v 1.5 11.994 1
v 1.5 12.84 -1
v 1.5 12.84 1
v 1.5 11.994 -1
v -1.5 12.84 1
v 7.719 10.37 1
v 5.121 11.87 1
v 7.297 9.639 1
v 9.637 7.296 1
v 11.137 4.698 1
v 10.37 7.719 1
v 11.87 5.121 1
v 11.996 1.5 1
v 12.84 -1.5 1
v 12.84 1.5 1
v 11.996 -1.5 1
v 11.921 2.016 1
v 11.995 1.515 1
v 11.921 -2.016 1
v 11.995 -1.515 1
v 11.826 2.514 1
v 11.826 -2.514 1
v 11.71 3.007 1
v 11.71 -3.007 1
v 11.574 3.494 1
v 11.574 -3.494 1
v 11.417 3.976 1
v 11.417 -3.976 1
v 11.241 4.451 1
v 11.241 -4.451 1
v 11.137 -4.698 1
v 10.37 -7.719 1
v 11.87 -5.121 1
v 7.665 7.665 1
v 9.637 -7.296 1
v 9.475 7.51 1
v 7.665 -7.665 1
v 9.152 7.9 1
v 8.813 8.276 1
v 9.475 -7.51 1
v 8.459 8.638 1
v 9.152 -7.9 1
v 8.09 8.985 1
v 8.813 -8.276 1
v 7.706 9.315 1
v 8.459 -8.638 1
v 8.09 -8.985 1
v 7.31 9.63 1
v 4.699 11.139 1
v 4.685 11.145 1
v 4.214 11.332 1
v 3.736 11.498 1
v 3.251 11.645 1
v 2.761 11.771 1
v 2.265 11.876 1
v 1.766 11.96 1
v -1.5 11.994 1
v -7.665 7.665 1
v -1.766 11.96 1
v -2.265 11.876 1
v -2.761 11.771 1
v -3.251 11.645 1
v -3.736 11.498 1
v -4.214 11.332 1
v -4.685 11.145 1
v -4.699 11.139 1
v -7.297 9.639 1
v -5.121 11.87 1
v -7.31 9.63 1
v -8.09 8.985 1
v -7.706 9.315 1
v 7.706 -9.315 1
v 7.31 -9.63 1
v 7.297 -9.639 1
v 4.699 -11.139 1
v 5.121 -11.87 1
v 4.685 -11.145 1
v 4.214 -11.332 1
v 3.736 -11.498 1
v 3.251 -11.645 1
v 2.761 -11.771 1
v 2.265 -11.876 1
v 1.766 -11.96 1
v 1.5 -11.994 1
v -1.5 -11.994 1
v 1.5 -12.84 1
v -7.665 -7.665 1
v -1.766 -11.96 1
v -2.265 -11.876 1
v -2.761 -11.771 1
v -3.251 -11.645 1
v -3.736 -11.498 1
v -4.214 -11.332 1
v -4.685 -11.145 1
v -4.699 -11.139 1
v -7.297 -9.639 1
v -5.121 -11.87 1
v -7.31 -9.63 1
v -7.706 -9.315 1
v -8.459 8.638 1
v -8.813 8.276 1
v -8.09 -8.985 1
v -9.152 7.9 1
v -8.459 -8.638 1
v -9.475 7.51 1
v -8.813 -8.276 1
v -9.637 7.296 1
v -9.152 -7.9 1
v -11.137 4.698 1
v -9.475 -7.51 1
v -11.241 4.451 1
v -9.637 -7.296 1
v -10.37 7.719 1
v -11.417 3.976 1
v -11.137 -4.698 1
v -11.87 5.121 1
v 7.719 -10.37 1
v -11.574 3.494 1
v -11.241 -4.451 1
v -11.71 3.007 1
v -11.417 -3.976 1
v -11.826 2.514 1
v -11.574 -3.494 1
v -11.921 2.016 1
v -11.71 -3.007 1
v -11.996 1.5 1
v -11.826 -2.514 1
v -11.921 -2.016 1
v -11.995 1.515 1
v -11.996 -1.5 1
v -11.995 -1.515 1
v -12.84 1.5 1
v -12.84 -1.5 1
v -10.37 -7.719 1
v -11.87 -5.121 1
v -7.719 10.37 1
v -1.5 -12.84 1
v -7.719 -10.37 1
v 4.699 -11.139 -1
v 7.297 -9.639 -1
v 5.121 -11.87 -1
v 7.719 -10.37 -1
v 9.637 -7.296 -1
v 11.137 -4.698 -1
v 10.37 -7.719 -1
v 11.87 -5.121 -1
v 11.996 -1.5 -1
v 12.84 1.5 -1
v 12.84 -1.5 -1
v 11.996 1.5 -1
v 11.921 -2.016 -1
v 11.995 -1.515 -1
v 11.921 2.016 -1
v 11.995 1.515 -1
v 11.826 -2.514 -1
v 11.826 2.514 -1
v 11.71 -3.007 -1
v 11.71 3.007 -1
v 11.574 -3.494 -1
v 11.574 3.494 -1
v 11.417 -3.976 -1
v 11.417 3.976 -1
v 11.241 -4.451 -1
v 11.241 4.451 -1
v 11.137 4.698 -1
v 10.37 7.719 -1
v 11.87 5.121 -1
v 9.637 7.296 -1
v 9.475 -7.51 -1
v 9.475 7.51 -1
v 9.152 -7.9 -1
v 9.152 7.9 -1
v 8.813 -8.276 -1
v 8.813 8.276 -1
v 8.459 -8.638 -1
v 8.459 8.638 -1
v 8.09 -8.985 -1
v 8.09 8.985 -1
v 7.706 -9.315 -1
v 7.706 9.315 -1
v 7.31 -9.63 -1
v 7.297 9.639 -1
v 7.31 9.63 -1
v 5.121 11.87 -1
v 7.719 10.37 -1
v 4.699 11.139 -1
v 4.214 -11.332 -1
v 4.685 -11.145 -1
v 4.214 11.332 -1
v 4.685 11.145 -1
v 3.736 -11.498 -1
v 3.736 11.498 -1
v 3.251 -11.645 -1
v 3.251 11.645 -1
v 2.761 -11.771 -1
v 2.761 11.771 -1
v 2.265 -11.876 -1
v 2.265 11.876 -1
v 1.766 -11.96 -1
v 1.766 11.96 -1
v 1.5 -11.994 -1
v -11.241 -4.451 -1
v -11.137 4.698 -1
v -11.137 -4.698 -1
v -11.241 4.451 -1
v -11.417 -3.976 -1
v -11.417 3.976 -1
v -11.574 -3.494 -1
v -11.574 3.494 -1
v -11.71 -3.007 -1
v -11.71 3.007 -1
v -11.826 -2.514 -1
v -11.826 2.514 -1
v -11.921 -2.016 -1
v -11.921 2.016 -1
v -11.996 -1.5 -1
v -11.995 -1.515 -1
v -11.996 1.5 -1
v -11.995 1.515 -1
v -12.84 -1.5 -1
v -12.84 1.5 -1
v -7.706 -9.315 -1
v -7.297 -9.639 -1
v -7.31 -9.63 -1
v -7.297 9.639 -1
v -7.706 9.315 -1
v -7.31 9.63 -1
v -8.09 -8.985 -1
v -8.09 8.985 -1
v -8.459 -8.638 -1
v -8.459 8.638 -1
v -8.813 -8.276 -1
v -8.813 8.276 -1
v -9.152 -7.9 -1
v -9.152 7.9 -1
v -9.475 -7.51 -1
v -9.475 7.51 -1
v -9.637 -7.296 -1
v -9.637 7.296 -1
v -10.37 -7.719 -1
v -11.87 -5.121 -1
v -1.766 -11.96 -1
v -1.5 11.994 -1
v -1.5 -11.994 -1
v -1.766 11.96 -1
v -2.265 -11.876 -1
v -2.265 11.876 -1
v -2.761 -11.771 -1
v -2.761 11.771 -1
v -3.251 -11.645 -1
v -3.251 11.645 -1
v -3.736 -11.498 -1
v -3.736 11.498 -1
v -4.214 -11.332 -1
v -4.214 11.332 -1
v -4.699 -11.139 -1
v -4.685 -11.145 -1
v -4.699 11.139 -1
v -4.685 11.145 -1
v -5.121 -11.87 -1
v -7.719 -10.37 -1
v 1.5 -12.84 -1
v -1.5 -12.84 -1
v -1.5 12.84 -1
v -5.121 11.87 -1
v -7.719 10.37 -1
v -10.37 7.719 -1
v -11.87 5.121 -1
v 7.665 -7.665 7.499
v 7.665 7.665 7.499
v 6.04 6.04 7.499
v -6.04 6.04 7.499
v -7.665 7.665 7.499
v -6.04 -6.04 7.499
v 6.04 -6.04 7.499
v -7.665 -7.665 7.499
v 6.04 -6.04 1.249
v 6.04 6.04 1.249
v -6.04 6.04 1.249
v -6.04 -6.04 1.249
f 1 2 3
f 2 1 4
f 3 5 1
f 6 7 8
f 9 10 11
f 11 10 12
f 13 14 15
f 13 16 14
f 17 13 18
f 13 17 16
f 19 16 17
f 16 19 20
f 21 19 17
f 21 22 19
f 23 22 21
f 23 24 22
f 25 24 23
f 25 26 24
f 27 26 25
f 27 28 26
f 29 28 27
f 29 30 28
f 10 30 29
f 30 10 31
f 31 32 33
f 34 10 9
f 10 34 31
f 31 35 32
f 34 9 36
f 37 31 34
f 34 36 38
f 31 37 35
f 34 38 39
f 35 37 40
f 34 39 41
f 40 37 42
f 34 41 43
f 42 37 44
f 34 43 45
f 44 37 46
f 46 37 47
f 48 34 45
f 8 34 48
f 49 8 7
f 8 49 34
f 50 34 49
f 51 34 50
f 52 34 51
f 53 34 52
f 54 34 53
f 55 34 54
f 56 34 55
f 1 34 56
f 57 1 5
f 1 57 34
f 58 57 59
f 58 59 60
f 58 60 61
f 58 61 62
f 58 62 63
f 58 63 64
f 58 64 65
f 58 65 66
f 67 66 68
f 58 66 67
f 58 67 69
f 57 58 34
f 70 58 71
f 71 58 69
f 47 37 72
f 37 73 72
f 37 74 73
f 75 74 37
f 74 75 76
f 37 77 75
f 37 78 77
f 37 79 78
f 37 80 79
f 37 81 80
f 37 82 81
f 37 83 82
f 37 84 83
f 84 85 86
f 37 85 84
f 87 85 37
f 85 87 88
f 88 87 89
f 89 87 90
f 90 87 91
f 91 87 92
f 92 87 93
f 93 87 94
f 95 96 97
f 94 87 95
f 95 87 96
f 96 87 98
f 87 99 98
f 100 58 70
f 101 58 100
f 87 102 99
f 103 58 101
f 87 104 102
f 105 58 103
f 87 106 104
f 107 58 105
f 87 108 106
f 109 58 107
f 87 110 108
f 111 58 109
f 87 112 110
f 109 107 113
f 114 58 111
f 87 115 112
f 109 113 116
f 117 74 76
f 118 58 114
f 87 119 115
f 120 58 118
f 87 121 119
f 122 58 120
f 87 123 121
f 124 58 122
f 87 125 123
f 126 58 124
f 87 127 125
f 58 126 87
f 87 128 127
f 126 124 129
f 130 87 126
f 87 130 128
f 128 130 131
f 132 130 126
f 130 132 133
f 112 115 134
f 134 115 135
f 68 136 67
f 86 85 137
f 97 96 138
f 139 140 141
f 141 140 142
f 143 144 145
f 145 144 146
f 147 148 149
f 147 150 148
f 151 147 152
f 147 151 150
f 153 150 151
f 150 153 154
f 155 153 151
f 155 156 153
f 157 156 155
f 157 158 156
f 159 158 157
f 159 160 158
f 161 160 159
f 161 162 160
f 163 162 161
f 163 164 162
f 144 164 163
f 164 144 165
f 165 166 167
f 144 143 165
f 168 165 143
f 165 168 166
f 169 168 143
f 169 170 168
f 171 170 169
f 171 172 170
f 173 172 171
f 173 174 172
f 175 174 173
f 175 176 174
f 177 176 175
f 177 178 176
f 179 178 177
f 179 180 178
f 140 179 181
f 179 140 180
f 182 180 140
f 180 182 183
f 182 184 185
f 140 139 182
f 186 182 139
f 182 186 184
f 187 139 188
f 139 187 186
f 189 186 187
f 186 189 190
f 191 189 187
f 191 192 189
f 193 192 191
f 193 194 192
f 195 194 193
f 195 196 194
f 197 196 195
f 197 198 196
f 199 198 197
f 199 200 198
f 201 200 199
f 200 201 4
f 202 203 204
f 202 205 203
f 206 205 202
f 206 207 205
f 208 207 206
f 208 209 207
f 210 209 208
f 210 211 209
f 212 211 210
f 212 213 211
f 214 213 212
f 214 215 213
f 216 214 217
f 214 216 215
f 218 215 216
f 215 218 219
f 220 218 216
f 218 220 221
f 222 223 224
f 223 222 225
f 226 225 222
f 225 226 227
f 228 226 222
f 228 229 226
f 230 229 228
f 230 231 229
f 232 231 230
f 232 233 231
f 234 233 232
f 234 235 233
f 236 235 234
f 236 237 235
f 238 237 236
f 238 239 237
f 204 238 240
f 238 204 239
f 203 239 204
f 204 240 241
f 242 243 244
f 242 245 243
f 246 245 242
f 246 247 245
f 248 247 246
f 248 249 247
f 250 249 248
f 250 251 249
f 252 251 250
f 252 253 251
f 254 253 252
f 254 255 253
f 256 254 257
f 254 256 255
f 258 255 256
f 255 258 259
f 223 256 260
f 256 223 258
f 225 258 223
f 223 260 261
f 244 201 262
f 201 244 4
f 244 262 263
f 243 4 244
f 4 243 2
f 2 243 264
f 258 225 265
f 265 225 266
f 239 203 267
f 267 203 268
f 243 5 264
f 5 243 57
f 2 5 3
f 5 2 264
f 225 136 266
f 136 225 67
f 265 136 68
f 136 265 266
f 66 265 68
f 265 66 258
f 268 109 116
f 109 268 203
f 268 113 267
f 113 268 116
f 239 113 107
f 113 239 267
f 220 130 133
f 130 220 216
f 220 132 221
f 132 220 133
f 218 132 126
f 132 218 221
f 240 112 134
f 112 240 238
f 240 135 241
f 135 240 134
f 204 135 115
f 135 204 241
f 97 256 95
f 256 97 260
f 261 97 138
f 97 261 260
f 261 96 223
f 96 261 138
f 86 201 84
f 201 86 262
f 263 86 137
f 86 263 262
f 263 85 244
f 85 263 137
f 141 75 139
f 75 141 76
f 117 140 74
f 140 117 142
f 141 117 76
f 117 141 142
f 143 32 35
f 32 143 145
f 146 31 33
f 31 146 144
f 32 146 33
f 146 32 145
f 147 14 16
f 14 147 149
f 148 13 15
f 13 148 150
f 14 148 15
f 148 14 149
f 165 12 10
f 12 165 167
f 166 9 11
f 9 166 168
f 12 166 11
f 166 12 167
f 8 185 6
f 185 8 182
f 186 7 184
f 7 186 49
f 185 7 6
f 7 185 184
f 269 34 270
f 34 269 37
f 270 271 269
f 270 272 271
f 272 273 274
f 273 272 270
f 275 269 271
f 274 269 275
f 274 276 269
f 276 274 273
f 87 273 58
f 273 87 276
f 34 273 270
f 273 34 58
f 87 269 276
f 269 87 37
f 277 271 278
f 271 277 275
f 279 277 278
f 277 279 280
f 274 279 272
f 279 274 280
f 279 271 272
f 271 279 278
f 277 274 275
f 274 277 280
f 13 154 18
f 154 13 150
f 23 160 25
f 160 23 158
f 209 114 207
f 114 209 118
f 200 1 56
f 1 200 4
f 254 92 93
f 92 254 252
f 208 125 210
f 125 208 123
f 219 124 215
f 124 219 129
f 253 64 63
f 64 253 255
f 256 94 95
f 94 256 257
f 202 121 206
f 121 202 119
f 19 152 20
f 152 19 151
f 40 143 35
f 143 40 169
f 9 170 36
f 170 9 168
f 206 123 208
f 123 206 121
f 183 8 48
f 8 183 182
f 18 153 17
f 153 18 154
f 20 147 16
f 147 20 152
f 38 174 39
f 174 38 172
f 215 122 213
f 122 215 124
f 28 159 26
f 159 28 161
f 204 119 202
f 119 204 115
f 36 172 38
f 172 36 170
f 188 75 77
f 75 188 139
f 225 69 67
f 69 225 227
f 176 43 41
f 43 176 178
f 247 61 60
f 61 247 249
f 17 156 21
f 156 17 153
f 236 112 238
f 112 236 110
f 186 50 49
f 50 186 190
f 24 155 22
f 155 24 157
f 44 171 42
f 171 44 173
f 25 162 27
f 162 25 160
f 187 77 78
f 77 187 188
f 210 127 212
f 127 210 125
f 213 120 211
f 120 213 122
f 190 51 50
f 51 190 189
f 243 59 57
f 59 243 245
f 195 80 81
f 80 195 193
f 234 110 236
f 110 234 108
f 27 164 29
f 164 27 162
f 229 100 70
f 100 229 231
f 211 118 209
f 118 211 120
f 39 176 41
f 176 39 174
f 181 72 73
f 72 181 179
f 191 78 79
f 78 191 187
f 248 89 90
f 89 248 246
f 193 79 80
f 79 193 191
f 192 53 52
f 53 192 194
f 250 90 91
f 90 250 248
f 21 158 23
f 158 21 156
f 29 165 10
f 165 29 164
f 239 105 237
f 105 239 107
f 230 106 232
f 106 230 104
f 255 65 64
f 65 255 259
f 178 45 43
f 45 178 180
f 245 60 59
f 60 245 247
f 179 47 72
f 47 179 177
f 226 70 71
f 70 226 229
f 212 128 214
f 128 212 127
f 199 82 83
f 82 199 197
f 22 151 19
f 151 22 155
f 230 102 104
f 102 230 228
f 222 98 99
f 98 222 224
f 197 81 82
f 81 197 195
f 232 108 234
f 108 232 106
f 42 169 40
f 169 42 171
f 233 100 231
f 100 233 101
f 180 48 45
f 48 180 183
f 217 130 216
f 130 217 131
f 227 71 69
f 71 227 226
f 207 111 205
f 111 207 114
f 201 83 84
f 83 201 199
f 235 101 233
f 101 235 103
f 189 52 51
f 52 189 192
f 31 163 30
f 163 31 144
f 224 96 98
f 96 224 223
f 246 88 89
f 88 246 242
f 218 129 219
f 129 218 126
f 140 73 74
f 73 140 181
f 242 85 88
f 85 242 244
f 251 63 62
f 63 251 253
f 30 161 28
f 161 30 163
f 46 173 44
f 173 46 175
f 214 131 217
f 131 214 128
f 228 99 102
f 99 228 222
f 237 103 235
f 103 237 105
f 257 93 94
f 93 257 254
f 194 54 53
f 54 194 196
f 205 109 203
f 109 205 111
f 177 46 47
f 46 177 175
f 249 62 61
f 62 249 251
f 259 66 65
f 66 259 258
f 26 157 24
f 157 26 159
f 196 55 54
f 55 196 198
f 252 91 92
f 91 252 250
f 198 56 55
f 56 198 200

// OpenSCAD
// Wurkkos HD10 Bezel Tool Finger Wrench
// 12mm Finger Box Wrench
// Version 1.0

$fn = 150;

///////// Variables
// Width of opening for wrench
box_inner_width = 12.08; // Fits over 12mm box

box_outer_width = box_inner_width + 3.25; // mm
box_height = 6.5; // mm

main_diameter = sqrt(pow(box_outer_width, 2) * 2) + 2.5; // mm - diameter of big cylinder
wing_width = 3; // mm
wing_offset = (main_diameter / 2) - (0.25 * wing_width); // offset inward slightly
wing_count = 12;
main_height = 2.0; // mm - height of cylinder and wings

box_z_offset = (main_height / 2) + (box_height / 2);

///////// Code
// Main cylinder
cylinder(h = main_height, d = main_diameter, center = true);

// Wings for grip
wing_spacing = 360 / wing_count;
for (i = [0:(wing_count - 1)]) {
    rotate([0, 0, (i * wing_spacing)]) {
        translate([0, wing_offset, 0]) {
            cube([wing_width, wing_width, main_height], center = true);
        }
    }
}

// Box as wrench
translate([0, 0, box_z_offset-0.001]) { // offset to make sure they form one object
    difference() {
        cube(size = [box_outer_width, box_outer_width, box_height], center = true);
        translate([0, 0, .25]) {
            cube(size = [box_inner_width, box_inner_width, box_height], center = true);
        }
    }
}
